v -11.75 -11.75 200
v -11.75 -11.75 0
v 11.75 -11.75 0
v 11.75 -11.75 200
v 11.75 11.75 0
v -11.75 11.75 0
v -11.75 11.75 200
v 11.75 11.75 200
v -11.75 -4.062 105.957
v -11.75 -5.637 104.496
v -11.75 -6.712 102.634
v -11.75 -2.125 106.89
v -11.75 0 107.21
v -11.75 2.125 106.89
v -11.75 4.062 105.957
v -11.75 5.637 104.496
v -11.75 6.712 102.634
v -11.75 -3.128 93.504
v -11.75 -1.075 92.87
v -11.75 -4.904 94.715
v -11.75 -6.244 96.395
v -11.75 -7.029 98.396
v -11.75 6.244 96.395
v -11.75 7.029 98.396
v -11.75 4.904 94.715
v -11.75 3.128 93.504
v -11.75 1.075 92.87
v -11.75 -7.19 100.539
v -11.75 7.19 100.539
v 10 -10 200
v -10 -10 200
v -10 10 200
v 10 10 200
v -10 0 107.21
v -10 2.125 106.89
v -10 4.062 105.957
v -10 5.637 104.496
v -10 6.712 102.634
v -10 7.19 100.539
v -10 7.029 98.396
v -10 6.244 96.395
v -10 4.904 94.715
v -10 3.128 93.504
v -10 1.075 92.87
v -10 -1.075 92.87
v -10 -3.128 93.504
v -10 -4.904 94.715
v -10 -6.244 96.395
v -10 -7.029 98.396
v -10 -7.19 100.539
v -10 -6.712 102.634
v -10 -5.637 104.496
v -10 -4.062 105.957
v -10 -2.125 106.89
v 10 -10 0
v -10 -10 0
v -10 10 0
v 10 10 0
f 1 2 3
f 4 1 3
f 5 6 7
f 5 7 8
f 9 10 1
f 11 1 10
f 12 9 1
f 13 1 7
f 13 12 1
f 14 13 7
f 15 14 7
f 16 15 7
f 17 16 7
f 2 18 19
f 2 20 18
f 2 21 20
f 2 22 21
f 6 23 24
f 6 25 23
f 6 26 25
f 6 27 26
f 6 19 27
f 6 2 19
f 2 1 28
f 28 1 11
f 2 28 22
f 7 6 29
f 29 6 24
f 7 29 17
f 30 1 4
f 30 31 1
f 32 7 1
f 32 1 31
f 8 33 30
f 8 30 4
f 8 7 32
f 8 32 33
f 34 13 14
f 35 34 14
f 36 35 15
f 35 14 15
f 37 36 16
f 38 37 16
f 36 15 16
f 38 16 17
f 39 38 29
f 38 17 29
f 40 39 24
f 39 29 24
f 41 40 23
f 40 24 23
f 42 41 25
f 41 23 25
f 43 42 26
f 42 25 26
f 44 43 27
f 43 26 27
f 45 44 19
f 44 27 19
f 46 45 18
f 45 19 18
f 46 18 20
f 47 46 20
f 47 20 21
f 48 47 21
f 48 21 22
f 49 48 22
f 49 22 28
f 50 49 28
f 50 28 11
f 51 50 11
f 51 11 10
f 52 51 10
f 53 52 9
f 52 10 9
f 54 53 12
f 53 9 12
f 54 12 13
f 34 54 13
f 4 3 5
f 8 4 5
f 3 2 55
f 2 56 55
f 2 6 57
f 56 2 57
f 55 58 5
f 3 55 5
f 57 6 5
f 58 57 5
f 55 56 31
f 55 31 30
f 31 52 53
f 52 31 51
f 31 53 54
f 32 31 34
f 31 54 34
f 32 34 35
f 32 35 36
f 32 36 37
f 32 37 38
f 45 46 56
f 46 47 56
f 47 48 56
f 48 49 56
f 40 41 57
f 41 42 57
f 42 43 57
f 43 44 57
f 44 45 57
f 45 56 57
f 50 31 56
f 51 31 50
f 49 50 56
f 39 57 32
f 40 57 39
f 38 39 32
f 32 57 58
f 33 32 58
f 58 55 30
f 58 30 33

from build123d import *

# Parameters (mm, degrees)
ESQUISSE1_W             = 23.5
ESQUISSE1_H             = 23.5
ESQUISSE1_W_2           = 20
ESQUISSE1_H_2           = 20
BOSS_EXTRU_1_DEPTH      = 200
ESQUISSE2_R             = 7.210256751
ENL_V_MAT_EXTRU_1_DEPTH = 1.75


with BuildPart() as part:
    # Esquisse1 → Boss.-Extru.1 (new body)
    with BuildSketch(Plane.XY):
        Rectangle(ESQUISSE1_W, ESQUISSE1_H)
        Rectangle(ESQUISSE1_W_2, ESQUISSE1_H_2, mode=Mode.SUBTRACT)
    extrude(amount=BOSS_EXTRU_1_DEPTH)

    # Esquisse2 → Enlèv. mat.-Extru.1 (cut)
    with BuildSketch(Plane.ZY.offset(11.75)):
        with Locations((100, 0)):
            Circle(ESQUISSE2_R)
    extrude(amount=-ENL_V_MAT_EXTRU_1_DEPTH, mode=Mode.SUBTRACT)


solid = part.part
